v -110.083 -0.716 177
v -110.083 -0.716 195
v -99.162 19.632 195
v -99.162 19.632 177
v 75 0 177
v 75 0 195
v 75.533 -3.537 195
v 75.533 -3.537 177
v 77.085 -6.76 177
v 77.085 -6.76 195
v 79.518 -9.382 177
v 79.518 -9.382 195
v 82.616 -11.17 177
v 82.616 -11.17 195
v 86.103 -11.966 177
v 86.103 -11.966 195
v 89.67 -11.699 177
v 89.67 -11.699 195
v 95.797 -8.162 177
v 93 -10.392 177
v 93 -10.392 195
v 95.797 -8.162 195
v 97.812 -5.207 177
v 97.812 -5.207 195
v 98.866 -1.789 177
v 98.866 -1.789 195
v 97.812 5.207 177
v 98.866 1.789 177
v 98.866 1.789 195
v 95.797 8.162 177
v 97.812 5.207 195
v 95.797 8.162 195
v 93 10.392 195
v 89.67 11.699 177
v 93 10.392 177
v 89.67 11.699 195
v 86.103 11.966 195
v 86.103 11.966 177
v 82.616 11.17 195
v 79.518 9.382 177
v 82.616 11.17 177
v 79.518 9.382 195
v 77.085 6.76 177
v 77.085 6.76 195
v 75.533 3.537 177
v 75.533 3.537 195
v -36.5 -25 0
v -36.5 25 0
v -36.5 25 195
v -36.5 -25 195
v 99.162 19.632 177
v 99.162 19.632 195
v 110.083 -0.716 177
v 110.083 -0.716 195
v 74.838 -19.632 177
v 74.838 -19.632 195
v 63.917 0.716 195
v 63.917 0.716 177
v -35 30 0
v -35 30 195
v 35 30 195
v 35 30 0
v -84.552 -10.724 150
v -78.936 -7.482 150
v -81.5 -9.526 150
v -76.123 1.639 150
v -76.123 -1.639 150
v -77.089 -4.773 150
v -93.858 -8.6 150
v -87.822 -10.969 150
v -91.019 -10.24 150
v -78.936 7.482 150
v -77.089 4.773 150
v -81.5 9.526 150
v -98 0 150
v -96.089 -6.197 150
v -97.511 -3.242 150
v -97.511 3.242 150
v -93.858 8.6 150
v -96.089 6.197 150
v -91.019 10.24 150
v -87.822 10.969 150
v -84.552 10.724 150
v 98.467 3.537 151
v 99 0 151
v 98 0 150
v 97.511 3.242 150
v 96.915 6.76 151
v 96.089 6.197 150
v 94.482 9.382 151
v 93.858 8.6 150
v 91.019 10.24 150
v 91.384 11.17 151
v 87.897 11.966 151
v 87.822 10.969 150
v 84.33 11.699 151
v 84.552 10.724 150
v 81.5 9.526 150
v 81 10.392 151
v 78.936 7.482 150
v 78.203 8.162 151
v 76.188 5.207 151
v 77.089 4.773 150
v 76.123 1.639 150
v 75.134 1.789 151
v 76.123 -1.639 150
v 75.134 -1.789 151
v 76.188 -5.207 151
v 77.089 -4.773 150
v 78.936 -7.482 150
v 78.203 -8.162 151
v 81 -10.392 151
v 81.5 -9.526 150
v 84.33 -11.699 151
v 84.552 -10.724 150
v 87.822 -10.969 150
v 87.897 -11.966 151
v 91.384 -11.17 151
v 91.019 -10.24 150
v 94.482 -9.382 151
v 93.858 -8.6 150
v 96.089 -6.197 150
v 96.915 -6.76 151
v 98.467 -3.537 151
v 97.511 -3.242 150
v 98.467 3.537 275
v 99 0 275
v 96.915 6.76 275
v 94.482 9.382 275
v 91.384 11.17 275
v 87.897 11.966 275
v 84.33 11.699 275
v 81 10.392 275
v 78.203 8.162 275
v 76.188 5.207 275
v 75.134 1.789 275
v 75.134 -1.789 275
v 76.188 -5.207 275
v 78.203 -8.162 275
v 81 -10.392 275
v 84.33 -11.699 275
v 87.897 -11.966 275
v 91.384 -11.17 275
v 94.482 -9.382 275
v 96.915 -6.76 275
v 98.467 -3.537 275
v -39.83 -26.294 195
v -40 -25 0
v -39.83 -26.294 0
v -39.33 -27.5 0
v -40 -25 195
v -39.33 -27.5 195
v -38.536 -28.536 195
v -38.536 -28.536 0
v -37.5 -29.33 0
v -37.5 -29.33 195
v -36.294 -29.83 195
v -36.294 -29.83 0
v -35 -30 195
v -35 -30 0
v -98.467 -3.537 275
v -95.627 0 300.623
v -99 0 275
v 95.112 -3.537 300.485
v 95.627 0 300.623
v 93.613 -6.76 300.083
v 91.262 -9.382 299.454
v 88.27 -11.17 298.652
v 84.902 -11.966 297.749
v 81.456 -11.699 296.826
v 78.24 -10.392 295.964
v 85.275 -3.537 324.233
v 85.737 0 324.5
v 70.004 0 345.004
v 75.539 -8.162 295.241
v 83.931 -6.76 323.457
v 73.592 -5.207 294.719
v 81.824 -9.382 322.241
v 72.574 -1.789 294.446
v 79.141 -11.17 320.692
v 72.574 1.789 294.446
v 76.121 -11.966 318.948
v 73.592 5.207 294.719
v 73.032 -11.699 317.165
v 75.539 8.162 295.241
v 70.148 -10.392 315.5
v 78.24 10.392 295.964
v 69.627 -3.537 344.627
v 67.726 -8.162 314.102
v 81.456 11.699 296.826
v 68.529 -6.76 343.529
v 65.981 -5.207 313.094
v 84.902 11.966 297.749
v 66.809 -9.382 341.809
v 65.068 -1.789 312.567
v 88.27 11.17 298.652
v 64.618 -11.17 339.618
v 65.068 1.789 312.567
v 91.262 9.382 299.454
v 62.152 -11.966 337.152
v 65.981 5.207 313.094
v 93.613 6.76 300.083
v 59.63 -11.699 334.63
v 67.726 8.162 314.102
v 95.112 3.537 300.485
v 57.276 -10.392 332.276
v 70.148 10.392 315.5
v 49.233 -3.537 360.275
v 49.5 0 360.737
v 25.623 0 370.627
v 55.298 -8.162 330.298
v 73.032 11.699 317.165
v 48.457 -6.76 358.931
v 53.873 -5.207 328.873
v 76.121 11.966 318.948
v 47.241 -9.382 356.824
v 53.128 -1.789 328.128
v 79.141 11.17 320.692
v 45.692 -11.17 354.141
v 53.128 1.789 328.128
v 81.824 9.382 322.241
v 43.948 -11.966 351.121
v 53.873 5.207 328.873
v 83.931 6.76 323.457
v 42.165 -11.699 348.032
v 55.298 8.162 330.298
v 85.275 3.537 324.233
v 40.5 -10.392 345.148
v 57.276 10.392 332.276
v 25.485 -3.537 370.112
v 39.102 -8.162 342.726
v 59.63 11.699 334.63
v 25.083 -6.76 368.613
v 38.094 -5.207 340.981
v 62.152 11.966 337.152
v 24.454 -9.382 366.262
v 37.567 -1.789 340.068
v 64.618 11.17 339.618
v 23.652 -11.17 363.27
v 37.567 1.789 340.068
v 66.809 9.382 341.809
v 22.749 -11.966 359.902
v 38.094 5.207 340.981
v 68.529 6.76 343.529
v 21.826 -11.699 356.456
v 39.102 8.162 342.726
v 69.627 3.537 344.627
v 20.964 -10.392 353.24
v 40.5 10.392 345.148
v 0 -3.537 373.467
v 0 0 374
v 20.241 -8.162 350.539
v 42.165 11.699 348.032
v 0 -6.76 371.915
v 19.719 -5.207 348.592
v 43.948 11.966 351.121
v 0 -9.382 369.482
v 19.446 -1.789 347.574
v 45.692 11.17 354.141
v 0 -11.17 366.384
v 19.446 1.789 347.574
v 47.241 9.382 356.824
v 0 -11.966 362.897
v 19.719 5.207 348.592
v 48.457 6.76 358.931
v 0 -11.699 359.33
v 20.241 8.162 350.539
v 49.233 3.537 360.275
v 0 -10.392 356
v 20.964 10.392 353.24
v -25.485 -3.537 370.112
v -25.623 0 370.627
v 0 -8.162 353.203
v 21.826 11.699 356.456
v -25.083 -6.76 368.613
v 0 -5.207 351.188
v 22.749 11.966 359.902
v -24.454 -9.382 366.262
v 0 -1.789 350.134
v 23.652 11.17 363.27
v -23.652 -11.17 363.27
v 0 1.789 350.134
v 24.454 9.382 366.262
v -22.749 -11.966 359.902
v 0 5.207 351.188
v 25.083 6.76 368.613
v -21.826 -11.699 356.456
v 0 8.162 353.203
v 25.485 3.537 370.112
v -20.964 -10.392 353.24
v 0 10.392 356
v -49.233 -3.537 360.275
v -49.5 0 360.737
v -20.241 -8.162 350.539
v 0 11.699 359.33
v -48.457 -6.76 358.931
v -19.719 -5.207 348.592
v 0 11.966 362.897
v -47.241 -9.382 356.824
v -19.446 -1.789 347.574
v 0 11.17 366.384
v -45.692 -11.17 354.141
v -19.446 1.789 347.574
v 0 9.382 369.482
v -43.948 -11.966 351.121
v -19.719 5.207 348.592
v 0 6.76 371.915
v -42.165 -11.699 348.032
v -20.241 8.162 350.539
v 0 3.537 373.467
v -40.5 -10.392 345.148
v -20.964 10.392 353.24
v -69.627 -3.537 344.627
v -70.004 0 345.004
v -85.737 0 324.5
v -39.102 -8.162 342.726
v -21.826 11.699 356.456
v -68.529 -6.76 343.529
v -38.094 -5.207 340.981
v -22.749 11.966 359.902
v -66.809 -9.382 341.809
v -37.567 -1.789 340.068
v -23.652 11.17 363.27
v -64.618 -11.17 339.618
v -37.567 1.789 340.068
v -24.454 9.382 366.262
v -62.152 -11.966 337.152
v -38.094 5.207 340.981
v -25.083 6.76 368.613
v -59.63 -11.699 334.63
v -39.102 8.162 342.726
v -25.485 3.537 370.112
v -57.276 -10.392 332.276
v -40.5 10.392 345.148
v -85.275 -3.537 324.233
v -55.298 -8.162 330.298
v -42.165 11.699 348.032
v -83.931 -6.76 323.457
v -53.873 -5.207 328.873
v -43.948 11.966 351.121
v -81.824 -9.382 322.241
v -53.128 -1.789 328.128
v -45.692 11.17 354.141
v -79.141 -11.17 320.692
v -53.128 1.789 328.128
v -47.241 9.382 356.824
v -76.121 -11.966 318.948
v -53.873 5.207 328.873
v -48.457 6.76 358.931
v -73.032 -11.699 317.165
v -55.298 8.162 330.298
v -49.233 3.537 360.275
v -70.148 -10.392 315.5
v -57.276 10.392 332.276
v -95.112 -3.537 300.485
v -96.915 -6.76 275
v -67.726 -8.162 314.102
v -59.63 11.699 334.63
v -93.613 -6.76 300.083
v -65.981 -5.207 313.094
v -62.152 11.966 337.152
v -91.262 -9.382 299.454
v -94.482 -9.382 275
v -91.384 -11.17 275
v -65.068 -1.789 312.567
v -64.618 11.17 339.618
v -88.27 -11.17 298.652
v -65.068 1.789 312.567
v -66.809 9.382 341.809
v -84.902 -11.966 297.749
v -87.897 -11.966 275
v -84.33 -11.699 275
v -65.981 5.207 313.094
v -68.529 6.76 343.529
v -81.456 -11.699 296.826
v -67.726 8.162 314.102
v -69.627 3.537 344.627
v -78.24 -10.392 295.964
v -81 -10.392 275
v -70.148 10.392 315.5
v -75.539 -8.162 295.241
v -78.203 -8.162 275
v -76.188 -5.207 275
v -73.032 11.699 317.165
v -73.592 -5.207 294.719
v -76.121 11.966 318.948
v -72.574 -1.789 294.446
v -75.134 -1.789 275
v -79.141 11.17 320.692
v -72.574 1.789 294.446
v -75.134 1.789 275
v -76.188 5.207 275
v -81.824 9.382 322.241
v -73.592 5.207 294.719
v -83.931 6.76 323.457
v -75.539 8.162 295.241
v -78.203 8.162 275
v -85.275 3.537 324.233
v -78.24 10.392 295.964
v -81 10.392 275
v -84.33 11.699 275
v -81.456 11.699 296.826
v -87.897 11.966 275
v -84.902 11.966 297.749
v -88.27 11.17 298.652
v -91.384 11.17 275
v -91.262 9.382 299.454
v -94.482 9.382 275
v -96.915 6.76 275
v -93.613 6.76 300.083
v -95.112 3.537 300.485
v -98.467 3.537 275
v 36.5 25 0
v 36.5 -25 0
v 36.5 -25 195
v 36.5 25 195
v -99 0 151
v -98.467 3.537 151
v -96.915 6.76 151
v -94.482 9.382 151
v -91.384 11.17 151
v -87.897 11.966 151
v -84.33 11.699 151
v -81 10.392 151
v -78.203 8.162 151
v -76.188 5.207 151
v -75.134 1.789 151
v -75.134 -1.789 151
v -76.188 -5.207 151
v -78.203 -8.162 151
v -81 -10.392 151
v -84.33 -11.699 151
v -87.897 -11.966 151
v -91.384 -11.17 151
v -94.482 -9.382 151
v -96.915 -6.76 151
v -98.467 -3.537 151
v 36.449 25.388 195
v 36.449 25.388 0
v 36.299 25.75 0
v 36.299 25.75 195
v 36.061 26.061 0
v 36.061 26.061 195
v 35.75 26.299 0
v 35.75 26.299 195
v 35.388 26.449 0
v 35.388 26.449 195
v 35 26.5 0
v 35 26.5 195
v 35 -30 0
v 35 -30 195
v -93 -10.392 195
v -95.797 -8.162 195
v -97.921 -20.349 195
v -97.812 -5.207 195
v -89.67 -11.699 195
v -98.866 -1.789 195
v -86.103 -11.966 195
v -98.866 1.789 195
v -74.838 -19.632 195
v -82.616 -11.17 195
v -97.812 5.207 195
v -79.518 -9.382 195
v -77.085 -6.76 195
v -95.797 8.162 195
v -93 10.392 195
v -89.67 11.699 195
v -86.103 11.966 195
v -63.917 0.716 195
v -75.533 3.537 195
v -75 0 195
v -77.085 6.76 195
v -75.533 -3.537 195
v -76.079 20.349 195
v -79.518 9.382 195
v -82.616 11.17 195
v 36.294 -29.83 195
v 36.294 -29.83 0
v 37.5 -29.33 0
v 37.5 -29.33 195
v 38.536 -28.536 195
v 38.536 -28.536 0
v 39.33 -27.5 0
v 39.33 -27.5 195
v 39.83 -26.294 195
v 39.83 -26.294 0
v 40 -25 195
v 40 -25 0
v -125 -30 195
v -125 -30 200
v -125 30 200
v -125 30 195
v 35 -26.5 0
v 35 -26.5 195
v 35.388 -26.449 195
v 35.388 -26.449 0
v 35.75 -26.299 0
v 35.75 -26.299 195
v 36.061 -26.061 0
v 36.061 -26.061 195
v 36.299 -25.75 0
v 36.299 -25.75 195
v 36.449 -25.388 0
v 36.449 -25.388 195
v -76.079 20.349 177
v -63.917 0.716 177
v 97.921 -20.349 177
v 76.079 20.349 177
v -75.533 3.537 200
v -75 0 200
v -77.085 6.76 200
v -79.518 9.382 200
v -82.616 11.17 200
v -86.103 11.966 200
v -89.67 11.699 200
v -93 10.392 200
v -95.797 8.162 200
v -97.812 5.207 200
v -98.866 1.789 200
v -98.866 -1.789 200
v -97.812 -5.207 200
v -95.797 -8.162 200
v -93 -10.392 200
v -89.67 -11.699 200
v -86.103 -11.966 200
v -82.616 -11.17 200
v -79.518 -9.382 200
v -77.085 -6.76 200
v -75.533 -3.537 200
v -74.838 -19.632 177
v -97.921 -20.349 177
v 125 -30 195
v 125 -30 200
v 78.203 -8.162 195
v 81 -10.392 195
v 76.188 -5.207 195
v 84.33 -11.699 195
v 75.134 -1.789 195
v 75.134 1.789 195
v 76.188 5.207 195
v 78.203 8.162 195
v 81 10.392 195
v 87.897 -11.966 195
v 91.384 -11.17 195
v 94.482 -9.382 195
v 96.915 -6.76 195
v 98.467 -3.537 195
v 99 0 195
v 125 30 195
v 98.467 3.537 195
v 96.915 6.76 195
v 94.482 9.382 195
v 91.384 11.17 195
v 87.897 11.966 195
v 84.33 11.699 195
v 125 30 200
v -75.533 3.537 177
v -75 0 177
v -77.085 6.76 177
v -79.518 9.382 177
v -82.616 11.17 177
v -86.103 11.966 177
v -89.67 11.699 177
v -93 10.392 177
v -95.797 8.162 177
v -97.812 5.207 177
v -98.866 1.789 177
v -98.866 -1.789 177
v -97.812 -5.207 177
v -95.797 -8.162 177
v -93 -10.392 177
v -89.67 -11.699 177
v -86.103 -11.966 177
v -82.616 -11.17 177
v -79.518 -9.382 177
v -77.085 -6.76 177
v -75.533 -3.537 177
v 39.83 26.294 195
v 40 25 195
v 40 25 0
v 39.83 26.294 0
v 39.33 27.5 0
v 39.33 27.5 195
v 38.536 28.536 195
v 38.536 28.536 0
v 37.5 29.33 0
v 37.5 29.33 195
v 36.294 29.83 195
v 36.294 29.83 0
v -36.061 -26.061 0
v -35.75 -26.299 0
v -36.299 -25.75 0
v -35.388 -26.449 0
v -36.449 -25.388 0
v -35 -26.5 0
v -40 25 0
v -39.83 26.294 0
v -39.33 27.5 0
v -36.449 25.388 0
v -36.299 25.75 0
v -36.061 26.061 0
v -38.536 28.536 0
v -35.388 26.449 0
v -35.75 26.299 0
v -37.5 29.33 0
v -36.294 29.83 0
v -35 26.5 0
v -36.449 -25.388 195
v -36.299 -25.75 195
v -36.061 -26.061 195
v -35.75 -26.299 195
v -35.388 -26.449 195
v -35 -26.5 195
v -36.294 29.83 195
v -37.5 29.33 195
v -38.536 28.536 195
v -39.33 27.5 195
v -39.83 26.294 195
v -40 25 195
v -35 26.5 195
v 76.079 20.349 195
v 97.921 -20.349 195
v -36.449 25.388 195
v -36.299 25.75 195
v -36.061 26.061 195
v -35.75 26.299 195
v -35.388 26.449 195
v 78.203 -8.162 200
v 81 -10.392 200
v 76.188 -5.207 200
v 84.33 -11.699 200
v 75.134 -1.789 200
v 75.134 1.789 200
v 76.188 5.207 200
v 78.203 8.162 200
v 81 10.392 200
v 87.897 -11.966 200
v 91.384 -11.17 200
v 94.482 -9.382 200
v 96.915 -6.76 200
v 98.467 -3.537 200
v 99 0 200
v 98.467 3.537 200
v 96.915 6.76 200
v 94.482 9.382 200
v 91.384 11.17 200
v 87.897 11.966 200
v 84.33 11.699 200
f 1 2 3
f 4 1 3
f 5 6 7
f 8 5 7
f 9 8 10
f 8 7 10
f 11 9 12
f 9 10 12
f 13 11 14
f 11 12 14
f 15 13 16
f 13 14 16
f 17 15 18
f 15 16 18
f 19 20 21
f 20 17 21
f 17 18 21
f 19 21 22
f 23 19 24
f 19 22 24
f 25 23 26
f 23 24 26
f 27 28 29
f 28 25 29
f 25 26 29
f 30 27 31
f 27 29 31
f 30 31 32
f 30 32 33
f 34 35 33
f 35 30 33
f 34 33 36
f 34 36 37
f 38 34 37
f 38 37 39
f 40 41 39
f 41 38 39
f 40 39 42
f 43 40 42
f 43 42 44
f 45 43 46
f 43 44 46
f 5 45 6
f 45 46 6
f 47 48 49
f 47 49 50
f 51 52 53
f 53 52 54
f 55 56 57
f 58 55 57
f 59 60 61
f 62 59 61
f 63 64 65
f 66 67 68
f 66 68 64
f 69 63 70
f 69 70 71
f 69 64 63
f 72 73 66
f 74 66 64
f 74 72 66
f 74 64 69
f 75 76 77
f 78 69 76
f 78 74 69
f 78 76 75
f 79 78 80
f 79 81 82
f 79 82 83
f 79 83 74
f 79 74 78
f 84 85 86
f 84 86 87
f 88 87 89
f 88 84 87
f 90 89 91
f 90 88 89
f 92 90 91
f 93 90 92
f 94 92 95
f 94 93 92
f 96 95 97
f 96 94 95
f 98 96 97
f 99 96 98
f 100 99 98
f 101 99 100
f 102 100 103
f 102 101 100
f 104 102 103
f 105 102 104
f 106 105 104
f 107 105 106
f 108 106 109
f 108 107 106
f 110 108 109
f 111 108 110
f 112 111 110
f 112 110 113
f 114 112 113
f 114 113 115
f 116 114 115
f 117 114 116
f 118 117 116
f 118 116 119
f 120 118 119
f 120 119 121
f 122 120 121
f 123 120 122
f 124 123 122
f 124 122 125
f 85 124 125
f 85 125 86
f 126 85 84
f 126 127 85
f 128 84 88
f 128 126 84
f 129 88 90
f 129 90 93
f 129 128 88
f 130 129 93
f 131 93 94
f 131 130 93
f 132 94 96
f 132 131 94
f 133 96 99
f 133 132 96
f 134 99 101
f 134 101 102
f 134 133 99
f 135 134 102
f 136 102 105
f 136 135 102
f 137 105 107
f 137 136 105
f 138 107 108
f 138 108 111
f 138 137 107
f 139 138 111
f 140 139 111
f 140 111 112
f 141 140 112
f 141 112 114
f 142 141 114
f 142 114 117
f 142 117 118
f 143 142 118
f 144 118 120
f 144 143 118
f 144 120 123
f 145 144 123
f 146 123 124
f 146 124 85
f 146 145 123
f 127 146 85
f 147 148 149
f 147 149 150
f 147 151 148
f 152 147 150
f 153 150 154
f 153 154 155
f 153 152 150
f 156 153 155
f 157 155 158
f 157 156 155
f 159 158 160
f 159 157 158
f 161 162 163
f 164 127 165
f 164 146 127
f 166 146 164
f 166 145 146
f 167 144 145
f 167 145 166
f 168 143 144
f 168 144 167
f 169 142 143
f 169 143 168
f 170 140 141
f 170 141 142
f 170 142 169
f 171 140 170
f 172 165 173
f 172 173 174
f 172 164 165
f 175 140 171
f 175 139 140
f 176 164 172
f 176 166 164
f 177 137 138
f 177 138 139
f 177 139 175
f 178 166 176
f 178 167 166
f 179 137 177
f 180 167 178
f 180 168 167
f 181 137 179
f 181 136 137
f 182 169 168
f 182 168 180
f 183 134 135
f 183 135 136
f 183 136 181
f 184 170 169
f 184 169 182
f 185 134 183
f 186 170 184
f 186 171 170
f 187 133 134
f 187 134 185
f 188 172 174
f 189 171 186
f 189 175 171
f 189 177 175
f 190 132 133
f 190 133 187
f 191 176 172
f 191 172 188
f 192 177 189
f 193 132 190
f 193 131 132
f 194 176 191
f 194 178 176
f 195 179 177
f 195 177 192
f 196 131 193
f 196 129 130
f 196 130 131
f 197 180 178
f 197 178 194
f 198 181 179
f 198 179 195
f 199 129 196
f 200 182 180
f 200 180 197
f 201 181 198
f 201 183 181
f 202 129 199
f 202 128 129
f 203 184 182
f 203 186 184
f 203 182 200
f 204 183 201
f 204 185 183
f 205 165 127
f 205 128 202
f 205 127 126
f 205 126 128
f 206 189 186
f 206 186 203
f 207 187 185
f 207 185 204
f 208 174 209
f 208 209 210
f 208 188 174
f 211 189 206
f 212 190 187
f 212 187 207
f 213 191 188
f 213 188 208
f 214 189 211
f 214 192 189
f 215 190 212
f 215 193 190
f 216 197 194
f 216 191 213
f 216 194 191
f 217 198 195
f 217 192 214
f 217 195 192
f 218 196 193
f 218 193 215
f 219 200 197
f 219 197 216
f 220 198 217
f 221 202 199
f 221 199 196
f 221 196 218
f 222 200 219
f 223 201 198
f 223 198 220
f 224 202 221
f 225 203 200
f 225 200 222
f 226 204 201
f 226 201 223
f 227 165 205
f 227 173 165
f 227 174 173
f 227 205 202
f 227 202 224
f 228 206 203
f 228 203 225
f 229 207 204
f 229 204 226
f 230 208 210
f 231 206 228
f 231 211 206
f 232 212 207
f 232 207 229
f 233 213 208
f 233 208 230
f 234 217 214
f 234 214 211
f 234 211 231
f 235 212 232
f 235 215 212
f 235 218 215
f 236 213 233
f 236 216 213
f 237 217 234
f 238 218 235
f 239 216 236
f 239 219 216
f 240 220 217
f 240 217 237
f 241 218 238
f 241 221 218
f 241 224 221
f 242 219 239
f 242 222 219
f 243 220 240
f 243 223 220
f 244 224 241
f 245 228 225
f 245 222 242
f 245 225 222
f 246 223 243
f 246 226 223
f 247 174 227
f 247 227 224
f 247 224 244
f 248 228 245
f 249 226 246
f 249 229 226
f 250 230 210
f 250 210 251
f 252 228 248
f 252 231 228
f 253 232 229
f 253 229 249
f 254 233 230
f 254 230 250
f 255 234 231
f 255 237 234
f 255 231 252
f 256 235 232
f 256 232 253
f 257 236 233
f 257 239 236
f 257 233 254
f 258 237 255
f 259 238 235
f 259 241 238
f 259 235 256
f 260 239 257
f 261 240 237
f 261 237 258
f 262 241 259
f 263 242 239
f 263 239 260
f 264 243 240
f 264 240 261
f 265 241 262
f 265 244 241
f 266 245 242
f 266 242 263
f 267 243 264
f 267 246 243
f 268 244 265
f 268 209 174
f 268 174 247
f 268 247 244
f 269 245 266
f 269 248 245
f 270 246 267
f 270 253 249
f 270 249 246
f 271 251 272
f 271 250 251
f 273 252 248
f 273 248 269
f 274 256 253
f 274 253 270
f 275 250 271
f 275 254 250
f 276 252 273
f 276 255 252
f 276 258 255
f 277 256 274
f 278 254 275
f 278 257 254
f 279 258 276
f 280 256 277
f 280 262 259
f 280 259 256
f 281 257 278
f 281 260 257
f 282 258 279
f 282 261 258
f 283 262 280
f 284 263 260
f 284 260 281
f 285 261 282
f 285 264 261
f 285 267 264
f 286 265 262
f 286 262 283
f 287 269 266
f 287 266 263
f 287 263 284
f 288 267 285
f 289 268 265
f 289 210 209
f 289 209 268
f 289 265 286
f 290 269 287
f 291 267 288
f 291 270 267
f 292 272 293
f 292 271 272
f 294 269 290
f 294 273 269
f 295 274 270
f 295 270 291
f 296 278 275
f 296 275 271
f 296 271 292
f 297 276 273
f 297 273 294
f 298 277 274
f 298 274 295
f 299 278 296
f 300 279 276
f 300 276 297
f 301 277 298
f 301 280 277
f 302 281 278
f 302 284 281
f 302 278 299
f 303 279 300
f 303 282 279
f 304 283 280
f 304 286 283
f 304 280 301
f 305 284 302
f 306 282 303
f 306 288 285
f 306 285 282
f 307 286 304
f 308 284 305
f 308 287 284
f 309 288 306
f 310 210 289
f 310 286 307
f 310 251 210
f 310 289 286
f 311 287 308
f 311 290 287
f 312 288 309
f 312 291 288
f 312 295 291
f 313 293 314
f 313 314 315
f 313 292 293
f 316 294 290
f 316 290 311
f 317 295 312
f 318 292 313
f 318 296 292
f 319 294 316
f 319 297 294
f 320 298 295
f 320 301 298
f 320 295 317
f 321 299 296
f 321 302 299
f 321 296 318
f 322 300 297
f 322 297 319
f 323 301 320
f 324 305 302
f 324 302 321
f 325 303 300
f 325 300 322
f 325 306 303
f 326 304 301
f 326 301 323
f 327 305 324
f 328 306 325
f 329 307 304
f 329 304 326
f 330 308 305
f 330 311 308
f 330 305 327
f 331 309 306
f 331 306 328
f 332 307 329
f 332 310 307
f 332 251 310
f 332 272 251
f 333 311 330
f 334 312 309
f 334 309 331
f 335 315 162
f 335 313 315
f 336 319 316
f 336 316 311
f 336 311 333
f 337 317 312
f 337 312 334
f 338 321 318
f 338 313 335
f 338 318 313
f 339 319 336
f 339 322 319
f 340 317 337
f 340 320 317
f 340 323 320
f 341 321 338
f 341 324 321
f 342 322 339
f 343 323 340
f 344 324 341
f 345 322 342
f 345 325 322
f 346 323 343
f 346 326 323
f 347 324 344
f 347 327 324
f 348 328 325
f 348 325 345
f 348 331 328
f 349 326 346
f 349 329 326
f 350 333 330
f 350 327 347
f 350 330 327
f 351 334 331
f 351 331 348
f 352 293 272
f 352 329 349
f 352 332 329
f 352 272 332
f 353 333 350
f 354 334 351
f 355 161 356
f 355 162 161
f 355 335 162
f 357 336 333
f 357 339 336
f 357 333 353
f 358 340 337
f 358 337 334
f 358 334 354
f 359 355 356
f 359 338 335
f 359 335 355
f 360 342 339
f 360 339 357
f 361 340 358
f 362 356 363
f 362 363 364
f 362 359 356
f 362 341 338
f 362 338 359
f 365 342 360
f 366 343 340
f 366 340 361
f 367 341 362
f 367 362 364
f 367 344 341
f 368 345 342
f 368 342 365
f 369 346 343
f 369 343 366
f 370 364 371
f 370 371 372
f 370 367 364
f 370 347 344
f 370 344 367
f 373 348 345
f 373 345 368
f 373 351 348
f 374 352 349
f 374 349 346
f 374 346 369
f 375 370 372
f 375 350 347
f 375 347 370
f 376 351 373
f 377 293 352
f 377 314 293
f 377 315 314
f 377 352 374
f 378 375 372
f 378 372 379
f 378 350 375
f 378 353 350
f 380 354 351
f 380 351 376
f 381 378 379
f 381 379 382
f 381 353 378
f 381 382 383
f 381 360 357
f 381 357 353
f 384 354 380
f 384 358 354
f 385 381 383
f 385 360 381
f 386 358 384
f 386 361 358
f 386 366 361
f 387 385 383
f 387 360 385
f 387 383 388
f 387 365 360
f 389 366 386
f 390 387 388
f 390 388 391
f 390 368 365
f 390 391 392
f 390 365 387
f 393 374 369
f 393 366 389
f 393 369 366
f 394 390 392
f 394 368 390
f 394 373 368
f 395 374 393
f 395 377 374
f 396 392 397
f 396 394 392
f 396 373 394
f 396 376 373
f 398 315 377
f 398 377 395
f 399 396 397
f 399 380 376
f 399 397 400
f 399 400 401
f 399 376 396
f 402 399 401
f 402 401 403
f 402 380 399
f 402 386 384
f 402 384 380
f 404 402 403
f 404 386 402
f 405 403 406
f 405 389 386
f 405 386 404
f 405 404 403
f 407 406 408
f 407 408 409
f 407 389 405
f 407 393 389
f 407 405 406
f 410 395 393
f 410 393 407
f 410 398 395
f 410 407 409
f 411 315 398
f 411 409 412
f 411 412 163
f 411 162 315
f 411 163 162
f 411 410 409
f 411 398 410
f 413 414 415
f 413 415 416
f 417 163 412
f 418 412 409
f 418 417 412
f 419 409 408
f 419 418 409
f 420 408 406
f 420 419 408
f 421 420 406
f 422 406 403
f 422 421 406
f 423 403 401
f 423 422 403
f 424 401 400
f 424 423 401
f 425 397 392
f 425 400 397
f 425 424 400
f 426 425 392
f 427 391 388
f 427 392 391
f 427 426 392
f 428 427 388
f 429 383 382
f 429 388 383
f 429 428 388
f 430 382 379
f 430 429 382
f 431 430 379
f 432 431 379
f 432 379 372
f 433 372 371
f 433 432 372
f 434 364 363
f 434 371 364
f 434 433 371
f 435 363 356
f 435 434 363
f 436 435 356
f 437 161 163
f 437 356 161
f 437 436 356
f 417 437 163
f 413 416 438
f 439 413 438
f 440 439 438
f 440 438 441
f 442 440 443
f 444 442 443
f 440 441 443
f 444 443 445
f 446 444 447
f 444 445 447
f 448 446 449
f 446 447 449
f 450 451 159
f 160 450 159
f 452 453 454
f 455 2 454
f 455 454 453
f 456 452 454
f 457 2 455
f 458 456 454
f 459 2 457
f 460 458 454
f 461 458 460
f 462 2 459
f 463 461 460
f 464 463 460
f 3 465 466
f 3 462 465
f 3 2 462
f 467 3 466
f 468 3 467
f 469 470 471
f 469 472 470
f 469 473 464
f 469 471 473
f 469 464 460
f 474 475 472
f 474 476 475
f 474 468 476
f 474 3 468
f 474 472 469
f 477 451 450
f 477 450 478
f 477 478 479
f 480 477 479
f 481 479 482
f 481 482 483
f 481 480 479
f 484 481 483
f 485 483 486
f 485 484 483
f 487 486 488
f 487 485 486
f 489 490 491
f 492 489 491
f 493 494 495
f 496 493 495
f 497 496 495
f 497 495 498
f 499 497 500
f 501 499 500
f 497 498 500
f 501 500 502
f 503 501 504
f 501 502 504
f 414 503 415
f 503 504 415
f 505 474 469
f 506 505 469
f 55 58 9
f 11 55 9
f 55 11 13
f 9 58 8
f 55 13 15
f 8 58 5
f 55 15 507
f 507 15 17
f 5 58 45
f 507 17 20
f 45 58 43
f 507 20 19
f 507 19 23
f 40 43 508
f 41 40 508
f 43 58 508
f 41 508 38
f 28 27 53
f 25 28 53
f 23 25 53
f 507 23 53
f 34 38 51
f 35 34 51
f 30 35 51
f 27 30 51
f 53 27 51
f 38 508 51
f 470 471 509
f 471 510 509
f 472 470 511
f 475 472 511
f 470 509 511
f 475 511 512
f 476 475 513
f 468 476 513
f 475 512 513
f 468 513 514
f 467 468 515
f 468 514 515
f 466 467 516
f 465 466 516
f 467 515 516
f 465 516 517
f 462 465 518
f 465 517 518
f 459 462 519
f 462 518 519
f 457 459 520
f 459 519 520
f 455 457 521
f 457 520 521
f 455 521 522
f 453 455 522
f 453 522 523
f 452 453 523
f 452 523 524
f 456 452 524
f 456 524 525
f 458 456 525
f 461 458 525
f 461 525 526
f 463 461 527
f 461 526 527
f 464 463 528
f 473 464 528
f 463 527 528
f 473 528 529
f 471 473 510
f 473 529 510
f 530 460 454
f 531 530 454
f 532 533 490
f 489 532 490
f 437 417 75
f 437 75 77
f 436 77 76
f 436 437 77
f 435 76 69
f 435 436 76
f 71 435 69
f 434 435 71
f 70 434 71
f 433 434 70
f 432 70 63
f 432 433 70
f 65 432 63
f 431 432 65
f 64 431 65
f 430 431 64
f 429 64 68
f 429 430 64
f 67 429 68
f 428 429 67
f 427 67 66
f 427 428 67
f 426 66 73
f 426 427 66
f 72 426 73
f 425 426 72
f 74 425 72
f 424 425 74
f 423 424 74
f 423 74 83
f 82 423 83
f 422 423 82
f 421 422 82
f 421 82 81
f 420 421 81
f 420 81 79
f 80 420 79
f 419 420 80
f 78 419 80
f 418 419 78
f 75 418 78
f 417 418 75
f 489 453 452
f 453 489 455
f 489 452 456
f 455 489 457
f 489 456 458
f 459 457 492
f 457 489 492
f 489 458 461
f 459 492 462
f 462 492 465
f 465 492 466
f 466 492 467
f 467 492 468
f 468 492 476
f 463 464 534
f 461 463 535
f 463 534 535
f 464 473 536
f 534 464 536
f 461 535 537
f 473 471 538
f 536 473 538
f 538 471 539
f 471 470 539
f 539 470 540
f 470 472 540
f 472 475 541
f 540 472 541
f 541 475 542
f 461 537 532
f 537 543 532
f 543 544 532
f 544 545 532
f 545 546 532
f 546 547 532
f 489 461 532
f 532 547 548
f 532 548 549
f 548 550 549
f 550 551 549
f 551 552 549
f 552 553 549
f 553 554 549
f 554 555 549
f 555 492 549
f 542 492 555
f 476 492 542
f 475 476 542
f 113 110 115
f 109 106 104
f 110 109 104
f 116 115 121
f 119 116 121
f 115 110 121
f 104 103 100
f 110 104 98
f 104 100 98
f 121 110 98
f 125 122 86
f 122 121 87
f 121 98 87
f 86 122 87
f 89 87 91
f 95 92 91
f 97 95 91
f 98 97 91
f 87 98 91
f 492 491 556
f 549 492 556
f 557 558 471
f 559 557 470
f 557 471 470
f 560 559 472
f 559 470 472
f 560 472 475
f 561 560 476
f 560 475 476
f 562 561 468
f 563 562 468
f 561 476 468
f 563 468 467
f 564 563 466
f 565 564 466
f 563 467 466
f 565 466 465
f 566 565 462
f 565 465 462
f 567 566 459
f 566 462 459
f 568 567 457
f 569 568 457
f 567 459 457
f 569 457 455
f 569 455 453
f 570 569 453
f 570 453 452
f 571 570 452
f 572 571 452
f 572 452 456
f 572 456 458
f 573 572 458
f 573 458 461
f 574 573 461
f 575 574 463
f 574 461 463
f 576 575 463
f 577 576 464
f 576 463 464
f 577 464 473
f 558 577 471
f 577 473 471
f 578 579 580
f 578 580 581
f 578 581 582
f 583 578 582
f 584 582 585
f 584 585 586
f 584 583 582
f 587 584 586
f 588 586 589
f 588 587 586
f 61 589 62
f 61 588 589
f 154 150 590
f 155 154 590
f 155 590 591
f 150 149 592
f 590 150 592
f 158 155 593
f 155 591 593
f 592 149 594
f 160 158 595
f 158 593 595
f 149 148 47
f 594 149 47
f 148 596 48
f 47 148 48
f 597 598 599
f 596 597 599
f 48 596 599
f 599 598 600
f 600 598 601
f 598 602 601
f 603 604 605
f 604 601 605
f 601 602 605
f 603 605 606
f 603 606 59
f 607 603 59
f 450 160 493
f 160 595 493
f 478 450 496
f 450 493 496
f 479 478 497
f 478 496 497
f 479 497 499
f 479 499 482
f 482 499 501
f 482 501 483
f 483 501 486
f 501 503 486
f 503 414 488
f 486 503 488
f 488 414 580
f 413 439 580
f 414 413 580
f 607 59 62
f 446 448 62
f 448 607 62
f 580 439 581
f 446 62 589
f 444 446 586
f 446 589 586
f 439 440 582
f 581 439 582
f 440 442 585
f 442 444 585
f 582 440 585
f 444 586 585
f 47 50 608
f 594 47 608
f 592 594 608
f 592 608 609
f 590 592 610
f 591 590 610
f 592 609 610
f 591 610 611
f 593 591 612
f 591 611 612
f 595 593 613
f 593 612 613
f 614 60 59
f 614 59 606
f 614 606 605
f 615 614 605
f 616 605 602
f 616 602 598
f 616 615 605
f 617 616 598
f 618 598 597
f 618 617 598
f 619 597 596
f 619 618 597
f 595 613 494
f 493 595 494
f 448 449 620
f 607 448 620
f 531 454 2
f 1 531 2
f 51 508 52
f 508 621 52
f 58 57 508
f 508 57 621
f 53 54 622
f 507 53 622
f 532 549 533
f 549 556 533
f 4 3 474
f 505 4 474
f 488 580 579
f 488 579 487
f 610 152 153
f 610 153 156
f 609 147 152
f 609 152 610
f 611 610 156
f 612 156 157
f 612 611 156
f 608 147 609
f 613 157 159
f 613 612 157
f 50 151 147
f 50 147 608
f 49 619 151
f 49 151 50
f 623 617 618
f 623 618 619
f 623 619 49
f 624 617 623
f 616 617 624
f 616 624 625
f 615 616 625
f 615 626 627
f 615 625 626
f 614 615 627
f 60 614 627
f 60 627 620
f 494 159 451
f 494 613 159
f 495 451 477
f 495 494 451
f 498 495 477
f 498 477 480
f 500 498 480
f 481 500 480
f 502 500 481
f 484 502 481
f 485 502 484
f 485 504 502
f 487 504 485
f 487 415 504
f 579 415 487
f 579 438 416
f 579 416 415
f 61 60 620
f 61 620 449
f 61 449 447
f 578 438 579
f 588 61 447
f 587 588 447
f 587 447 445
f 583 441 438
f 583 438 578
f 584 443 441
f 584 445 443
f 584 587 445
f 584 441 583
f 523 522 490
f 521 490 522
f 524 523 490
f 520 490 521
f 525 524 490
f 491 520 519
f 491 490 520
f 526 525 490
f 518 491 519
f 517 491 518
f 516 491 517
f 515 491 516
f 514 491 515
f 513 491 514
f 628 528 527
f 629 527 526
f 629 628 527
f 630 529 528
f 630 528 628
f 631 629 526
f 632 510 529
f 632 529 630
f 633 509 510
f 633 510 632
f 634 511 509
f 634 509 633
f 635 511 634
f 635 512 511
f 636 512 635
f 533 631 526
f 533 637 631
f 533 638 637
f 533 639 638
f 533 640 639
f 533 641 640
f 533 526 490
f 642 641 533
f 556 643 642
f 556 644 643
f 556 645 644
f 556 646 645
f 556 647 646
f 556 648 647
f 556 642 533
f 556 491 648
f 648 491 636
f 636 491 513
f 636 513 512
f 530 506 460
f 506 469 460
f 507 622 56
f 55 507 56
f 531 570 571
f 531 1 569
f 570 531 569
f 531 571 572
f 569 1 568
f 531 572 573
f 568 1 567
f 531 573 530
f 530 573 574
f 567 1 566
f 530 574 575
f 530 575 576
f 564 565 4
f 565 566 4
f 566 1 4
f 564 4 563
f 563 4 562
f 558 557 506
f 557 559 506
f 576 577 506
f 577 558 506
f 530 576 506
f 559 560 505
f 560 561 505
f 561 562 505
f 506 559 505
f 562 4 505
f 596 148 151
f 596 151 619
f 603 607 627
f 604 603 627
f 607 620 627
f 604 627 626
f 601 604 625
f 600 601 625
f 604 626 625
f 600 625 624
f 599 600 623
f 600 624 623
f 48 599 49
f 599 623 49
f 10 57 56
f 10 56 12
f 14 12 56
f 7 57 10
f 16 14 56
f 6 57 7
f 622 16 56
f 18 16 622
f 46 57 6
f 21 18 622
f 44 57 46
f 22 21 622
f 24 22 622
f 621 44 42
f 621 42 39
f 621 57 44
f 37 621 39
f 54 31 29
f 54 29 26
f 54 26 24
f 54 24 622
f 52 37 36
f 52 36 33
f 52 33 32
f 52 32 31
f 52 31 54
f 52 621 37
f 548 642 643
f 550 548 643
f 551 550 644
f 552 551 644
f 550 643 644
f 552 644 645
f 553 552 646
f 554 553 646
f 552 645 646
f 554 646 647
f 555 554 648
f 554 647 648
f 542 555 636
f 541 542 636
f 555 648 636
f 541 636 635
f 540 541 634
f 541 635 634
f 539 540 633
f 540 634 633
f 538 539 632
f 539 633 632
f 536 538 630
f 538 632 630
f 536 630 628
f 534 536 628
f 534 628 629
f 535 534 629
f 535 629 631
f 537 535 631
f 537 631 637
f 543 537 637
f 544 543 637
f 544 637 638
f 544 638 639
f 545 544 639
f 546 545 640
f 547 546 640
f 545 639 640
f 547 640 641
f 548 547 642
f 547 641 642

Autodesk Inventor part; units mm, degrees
ref_plane "YZ Plane" through (0, 0, 0) normal (1, 0, 0) x (0, 1, 0)
sketch "Sketch1" plane through (0, 0, 0) normal (0, 1, 0) x (-1, 0, 0)
  arc A0 (-75, 275) -> (75, 275) centre (0, 275) ccw construction
  line L0 (75, 200) -> (-75, 200) construction
  line L1 (75, 275) -> (75, 150)
  line L2 (-75, 275) -> (-75, 150)
  arc A1 (75, 275) -> (-75, 275) centre (0, 275) ccw
  line L3 (75, 150) -> (-75, 150) construction
  point P0 (0, 0)
  dimension "Thread" = 50
  dimension "d13" = 275
ref_plane "Work Plane1" through (-75, 0, 150) normal (0, 0, -1) x (-1, 0, 0)
sketch "Sketch2" plane through (-75, 0, 150) normal (0, 0, -1) x (-1, 0, 0)
  circle A0 centre (12, 0) radius 12
  point P0 (-75, 0)
  point P1 (0, 0)
  dimension "d2" = 24
sweep "Sweep1" add profiles "Sketch2" path "Sketch1"
thread "Thread1"
thread "Thread2"
chamfer "Chamfer1" distance 1 angle 45 4 edges at (75, 0, 150) (75, 0, 275) (-75, 0, 275) (-75, 0, 150)
ref_plane "Work Plane3" through (-75, 0, 200) normal (0, 0, 1) x (1, 0, 0)
sketch "Sketch3" plane through (-75, 0, 200) normal (0, 0, 1) x (1, 0, 0)
  line L0 (200, -30) -> (-50, -30)
  line L1 (-50, -30) -> (-50, 30)
  line L2 (-50, 30) -> (200, 30)
  line L3 (200, 30) -> (200, -30)
  line L4 (200, -30) -> (-50, 30) construction
  line L5 (-50, -30) -> (200, 30) construction
  circle A0 centre (-12, 0) radius 12 projected
  circle A1 centre (162, 0) radius 12 projected
  line L6 (110, -30) -> (40, -30)
  line L7 (35, -25) -> (35, 25)
  line L8 (40, 30) -> (110, 30)
  line L9 (115, 25) -> (115, -25)
  line L10 (115, -30) -> (35, 30) construction
  line L11 (35, -30) -> (115, 30) construction
  arc A2 (35, -25) -> (40, -30) centre (40, -25) ccw
  arc A3 (40, 30) -> (35, 25) centre (40, 25) ccw
  arc A4 (115, 25) -> (110, 30) centre (110, 25) ccw
  arc A5 (110, -30) -> (115, -25) centre (110, -25) ccw
  line L12 (38.5, 25) -> (38.5, -25)
  arc A6 (38.5, -25) -> (40, -26.5) centre (40, -25) ccw
  line L13 (40, -26.5) -> (110, -26.5)
  arc A7 (110, -26.5) -> (111.5, -25) centre (110, -25) ccw
  line L14 (111.5, -25) -> (111.5, 25)
  arc A8 (111.5, 25) -> (110, 26.5) centre (110, 25) ccw
  line L15 (110, 26.5) -> (40, 26.5)
  arc A9 (40, 26.5) -> (38.5, 25) centre (40, 25) ccw
  line L16 (0.1619, -19.6321) -> (-22.921, -20.3486)
  line L17 (-22.921, -20.3486) -> (-35.0829, -0.7165)
  line L18 (-35.0829, -0.7165) -> (-24.1619, 19.6321)
  line L19 (-24.1619, 19.6321) -> (-1.079, 20.3486)
  line L20 (-1.079, 20.3486) -> (11.0829, 0.7165)
  line L21 (11.0829, 0.7165) -> (0.1619, -19.6321)
  point P0 (75, 0)
  dimension "d15" = 250
  dimension "d16" = 60
  dimension "d21" = 80
  dimension "d22" = 60
  dimension "d23" = 5
  dimension "d24" = 3.5
  dimension "d27" = 40
extrude "Extrusion1" add sketch "Sketch3" against normal blind 5 separate body contours L0 A5 L9 A4 L2 L3 | L0 A2 L7 A3 L2 A4 L9 A5 | L0 L1 L2 A3 L7 A2 | A0 | A1 | A9 L15 A8 L14 A7 L13 A6 L12 | L16 L17 L18 L19 L20 L21
extrude "Extrusion2" cut sketch "Sketch3" against normal through all contours A0 | A1 bodies 2
extrude "Extrusion3" add sketch "Sketch3" against normal up to surface (195 mm away) from surface at -5 separate body contours L0 A2 L7 A3 L2 A4 L9 A5
extrude "Extrusion4" add sketch "Sketch3" against normal blind 18 from surface at -5 separate body contours L16 L17 L18 L19 L20 L21
mirror "Mirror1" about plane through (0, 0, 0) normal (1, 0, 0) bodies 4
equation "\"d4\" = Thread"
equation "\"d6\" = Thread"
properties part number "Pipe Support U-Ring" material "Stainless Steel"
